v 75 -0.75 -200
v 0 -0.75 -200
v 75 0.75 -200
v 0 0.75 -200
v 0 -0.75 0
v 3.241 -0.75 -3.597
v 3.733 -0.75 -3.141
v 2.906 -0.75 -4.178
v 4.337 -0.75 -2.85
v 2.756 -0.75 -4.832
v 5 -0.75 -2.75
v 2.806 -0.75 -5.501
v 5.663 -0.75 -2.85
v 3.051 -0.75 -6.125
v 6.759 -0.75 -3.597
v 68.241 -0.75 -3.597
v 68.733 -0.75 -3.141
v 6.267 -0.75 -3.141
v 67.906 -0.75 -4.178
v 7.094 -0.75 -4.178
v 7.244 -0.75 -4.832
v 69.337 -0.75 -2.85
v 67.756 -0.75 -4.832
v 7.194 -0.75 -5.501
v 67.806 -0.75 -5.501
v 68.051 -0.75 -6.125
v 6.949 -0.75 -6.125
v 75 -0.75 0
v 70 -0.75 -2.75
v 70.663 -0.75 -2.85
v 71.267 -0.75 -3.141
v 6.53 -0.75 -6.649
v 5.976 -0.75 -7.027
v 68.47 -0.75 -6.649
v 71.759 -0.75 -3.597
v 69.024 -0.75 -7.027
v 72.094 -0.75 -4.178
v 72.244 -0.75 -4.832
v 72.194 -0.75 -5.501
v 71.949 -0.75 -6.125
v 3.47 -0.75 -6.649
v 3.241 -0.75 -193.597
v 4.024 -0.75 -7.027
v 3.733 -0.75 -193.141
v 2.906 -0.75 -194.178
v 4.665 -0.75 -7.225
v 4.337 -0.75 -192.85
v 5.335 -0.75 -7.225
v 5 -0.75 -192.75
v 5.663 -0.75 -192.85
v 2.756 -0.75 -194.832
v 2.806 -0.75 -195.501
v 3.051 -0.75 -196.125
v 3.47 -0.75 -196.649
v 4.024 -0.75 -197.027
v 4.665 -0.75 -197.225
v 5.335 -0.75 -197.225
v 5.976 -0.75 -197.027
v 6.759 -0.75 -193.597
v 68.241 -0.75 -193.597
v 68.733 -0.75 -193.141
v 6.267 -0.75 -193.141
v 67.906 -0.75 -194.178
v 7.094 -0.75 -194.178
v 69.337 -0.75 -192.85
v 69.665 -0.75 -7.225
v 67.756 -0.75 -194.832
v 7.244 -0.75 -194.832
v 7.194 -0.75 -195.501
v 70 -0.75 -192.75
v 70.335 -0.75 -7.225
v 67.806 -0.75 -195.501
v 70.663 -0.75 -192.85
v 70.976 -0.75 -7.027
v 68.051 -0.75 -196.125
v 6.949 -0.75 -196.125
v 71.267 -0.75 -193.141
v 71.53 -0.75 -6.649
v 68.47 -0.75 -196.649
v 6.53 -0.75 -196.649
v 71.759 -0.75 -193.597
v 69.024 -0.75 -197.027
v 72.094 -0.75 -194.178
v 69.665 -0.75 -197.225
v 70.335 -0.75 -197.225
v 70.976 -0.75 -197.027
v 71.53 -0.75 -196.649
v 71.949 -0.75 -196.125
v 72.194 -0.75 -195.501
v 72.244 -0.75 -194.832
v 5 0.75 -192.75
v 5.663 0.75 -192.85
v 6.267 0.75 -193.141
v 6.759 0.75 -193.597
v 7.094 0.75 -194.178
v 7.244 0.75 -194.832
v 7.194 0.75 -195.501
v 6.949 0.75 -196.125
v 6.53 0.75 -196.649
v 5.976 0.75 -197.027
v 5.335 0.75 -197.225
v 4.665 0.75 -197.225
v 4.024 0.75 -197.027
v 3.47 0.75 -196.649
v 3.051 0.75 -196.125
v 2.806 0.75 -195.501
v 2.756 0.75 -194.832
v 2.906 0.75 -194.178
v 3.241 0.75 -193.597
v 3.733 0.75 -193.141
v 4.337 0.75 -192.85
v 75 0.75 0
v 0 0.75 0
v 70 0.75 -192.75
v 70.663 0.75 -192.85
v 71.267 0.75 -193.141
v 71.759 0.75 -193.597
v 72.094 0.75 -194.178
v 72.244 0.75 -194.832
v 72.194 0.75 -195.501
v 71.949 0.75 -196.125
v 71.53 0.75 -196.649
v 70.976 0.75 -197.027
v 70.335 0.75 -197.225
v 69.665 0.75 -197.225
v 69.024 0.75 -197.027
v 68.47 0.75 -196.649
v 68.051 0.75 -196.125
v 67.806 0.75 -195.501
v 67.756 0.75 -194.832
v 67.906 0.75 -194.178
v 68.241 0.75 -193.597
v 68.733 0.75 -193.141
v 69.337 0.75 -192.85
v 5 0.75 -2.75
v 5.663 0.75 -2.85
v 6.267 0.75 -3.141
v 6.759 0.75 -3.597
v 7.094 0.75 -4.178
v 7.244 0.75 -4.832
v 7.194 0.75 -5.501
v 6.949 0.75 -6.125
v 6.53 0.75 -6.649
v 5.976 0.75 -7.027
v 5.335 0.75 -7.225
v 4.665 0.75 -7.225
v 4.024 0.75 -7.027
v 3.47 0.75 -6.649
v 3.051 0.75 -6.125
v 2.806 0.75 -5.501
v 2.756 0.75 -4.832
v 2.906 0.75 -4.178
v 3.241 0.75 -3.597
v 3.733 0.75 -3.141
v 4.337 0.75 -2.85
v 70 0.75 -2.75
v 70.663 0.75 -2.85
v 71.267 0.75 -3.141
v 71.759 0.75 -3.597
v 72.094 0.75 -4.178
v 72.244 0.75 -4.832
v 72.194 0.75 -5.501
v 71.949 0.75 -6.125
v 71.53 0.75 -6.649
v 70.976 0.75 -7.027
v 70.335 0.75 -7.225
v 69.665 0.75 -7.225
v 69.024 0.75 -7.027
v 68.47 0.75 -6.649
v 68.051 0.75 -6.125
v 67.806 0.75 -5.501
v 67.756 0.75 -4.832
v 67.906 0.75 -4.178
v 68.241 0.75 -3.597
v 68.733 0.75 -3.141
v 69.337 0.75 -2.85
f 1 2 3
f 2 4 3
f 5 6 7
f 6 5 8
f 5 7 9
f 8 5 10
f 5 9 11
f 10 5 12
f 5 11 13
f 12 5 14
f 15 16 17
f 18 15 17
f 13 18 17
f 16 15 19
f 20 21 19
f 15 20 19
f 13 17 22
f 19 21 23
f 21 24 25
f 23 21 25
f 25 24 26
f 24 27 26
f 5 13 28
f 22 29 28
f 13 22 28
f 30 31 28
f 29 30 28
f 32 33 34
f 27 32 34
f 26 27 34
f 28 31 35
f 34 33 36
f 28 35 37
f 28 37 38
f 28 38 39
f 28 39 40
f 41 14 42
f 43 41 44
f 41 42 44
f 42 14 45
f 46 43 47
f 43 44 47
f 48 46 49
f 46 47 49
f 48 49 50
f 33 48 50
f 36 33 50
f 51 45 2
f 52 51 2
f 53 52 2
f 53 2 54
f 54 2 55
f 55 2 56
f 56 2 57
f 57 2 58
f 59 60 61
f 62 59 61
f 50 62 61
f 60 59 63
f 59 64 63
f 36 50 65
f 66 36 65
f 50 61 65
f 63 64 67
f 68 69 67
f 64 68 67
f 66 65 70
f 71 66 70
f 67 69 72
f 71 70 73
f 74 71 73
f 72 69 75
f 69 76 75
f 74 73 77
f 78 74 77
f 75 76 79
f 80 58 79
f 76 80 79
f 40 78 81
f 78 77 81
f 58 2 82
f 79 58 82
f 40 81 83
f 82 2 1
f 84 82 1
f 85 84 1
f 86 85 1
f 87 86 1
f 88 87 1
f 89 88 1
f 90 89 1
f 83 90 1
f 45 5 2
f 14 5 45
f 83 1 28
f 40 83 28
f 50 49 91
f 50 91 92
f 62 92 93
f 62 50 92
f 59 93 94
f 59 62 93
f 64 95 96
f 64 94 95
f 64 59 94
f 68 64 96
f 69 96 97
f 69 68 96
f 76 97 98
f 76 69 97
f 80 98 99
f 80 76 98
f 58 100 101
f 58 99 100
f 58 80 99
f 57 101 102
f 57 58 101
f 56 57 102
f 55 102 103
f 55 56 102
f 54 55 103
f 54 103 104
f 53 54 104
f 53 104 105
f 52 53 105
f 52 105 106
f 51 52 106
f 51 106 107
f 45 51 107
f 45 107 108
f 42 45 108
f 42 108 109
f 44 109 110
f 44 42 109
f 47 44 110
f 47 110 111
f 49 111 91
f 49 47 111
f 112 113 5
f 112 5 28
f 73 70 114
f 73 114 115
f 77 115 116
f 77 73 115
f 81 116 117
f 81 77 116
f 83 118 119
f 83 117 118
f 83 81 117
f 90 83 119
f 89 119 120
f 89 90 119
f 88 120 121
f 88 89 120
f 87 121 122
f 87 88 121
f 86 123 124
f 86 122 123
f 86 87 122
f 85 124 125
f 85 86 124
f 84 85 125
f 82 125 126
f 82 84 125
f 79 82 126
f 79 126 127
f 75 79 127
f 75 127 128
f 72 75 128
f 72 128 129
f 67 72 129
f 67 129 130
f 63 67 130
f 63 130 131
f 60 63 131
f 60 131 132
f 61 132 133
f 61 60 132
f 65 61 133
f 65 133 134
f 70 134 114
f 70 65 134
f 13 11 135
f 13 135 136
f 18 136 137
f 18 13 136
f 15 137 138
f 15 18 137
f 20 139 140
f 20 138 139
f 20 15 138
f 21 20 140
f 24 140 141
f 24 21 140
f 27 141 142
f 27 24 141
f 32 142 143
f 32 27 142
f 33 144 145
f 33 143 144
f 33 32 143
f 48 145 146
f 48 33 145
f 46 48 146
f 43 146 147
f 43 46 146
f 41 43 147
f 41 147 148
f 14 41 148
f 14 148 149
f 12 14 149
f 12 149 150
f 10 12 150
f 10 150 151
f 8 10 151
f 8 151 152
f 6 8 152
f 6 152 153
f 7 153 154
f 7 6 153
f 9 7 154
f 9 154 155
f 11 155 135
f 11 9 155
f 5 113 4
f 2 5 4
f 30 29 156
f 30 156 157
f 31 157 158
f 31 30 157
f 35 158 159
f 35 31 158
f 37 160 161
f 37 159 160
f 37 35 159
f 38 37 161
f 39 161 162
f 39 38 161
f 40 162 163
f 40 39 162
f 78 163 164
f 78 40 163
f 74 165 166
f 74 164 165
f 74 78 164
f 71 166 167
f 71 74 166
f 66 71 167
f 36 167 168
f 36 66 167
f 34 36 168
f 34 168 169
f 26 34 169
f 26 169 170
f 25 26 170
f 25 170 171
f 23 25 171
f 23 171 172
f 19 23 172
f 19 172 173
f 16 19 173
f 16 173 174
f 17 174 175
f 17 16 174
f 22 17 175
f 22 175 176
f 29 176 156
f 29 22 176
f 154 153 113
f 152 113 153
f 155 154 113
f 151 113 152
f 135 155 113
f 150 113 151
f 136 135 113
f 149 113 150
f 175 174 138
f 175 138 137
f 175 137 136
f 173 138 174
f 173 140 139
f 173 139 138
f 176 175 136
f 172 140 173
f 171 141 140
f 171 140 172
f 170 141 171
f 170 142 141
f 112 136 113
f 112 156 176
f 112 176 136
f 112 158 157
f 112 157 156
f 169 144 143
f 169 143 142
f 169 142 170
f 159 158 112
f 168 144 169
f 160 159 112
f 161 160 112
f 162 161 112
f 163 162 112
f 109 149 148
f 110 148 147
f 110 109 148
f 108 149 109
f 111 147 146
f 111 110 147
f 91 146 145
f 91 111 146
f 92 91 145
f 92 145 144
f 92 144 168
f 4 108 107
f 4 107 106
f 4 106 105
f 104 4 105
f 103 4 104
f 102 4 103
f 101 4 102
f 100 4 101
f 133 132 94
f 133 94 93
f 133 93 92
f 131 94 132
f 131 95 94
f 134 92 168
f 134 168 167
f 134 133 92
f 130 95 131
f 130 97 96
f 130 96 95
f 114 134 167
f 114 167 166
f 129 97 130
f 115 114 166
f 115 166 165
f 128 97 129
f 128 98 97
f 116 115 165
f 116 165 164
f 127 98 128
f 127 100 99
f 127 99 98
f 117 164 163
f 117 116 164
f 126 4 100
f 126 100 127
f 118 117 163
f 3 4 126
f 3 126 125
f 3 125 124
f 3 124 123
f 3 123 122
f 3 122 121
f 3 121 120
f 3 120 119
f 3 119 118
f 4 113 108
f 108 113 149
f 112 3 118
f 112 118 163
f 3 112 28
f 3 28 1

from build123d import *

# Parameters (mm, degrees)
SKETCH1_W               = 75
SKETCH1_H               = 200
BOSS_EXTRUDE1_DEPTH     = 0.75
CUT_EXTRUDE1_DEPTH      = 214.60536042
CUT_EXTRUDE1_DEPTH_BACK = 214.60536042
SKETCH2_R               = 2.25


with BuildPart() as part:
    # Sketch1 → Boss-Extrude1 (new, symmetric)
    with BuildSketch(Plane(origin=(0, 0, 0), x_dir=(1, 0, 0), z_dir=(0, 1, 0))):
        with Locations((37.5, 100)):
            Rectangle(SKETCH1_W, SKETCH1_H)
    extrude(amount=BOSS_EXTRUDE1_DEPTH, both=True)

    # Sketch2 → Cut-Extrude1 (cut, two sides: drawn at the far end of the back side and taken through both)
    with BuildSketch(Plane(origin=(0, 0.75, 0), x_dir=(1, 0, 0), z_dir=(0, 1, 0)).offset(-CUT_EXTRUDE1_DEPTH_BACK)):
        with Locations(Location((5, 195, 0), (0, 0, 270))):
            Circle(SKETCH2_R)
        with Locations(Location((70, 195, 0), (0, 0, 270))):
            Circle(SKETCH2_R)
        with Locations(Location((5, 5, 0), (0, 0, 270))):
            Circle(SKETCH2_R)
        with Locations(Location((70, 5, 0), (0, 0, 270))):
            Circle(SKETCH2_R)
    extrude(amount=CUT_EXTRUDE1_DEPTH + CUT_EXTRUDE1_DEPTH_BACK, mode=Mode.SUBTRACT)


solid = part.part
